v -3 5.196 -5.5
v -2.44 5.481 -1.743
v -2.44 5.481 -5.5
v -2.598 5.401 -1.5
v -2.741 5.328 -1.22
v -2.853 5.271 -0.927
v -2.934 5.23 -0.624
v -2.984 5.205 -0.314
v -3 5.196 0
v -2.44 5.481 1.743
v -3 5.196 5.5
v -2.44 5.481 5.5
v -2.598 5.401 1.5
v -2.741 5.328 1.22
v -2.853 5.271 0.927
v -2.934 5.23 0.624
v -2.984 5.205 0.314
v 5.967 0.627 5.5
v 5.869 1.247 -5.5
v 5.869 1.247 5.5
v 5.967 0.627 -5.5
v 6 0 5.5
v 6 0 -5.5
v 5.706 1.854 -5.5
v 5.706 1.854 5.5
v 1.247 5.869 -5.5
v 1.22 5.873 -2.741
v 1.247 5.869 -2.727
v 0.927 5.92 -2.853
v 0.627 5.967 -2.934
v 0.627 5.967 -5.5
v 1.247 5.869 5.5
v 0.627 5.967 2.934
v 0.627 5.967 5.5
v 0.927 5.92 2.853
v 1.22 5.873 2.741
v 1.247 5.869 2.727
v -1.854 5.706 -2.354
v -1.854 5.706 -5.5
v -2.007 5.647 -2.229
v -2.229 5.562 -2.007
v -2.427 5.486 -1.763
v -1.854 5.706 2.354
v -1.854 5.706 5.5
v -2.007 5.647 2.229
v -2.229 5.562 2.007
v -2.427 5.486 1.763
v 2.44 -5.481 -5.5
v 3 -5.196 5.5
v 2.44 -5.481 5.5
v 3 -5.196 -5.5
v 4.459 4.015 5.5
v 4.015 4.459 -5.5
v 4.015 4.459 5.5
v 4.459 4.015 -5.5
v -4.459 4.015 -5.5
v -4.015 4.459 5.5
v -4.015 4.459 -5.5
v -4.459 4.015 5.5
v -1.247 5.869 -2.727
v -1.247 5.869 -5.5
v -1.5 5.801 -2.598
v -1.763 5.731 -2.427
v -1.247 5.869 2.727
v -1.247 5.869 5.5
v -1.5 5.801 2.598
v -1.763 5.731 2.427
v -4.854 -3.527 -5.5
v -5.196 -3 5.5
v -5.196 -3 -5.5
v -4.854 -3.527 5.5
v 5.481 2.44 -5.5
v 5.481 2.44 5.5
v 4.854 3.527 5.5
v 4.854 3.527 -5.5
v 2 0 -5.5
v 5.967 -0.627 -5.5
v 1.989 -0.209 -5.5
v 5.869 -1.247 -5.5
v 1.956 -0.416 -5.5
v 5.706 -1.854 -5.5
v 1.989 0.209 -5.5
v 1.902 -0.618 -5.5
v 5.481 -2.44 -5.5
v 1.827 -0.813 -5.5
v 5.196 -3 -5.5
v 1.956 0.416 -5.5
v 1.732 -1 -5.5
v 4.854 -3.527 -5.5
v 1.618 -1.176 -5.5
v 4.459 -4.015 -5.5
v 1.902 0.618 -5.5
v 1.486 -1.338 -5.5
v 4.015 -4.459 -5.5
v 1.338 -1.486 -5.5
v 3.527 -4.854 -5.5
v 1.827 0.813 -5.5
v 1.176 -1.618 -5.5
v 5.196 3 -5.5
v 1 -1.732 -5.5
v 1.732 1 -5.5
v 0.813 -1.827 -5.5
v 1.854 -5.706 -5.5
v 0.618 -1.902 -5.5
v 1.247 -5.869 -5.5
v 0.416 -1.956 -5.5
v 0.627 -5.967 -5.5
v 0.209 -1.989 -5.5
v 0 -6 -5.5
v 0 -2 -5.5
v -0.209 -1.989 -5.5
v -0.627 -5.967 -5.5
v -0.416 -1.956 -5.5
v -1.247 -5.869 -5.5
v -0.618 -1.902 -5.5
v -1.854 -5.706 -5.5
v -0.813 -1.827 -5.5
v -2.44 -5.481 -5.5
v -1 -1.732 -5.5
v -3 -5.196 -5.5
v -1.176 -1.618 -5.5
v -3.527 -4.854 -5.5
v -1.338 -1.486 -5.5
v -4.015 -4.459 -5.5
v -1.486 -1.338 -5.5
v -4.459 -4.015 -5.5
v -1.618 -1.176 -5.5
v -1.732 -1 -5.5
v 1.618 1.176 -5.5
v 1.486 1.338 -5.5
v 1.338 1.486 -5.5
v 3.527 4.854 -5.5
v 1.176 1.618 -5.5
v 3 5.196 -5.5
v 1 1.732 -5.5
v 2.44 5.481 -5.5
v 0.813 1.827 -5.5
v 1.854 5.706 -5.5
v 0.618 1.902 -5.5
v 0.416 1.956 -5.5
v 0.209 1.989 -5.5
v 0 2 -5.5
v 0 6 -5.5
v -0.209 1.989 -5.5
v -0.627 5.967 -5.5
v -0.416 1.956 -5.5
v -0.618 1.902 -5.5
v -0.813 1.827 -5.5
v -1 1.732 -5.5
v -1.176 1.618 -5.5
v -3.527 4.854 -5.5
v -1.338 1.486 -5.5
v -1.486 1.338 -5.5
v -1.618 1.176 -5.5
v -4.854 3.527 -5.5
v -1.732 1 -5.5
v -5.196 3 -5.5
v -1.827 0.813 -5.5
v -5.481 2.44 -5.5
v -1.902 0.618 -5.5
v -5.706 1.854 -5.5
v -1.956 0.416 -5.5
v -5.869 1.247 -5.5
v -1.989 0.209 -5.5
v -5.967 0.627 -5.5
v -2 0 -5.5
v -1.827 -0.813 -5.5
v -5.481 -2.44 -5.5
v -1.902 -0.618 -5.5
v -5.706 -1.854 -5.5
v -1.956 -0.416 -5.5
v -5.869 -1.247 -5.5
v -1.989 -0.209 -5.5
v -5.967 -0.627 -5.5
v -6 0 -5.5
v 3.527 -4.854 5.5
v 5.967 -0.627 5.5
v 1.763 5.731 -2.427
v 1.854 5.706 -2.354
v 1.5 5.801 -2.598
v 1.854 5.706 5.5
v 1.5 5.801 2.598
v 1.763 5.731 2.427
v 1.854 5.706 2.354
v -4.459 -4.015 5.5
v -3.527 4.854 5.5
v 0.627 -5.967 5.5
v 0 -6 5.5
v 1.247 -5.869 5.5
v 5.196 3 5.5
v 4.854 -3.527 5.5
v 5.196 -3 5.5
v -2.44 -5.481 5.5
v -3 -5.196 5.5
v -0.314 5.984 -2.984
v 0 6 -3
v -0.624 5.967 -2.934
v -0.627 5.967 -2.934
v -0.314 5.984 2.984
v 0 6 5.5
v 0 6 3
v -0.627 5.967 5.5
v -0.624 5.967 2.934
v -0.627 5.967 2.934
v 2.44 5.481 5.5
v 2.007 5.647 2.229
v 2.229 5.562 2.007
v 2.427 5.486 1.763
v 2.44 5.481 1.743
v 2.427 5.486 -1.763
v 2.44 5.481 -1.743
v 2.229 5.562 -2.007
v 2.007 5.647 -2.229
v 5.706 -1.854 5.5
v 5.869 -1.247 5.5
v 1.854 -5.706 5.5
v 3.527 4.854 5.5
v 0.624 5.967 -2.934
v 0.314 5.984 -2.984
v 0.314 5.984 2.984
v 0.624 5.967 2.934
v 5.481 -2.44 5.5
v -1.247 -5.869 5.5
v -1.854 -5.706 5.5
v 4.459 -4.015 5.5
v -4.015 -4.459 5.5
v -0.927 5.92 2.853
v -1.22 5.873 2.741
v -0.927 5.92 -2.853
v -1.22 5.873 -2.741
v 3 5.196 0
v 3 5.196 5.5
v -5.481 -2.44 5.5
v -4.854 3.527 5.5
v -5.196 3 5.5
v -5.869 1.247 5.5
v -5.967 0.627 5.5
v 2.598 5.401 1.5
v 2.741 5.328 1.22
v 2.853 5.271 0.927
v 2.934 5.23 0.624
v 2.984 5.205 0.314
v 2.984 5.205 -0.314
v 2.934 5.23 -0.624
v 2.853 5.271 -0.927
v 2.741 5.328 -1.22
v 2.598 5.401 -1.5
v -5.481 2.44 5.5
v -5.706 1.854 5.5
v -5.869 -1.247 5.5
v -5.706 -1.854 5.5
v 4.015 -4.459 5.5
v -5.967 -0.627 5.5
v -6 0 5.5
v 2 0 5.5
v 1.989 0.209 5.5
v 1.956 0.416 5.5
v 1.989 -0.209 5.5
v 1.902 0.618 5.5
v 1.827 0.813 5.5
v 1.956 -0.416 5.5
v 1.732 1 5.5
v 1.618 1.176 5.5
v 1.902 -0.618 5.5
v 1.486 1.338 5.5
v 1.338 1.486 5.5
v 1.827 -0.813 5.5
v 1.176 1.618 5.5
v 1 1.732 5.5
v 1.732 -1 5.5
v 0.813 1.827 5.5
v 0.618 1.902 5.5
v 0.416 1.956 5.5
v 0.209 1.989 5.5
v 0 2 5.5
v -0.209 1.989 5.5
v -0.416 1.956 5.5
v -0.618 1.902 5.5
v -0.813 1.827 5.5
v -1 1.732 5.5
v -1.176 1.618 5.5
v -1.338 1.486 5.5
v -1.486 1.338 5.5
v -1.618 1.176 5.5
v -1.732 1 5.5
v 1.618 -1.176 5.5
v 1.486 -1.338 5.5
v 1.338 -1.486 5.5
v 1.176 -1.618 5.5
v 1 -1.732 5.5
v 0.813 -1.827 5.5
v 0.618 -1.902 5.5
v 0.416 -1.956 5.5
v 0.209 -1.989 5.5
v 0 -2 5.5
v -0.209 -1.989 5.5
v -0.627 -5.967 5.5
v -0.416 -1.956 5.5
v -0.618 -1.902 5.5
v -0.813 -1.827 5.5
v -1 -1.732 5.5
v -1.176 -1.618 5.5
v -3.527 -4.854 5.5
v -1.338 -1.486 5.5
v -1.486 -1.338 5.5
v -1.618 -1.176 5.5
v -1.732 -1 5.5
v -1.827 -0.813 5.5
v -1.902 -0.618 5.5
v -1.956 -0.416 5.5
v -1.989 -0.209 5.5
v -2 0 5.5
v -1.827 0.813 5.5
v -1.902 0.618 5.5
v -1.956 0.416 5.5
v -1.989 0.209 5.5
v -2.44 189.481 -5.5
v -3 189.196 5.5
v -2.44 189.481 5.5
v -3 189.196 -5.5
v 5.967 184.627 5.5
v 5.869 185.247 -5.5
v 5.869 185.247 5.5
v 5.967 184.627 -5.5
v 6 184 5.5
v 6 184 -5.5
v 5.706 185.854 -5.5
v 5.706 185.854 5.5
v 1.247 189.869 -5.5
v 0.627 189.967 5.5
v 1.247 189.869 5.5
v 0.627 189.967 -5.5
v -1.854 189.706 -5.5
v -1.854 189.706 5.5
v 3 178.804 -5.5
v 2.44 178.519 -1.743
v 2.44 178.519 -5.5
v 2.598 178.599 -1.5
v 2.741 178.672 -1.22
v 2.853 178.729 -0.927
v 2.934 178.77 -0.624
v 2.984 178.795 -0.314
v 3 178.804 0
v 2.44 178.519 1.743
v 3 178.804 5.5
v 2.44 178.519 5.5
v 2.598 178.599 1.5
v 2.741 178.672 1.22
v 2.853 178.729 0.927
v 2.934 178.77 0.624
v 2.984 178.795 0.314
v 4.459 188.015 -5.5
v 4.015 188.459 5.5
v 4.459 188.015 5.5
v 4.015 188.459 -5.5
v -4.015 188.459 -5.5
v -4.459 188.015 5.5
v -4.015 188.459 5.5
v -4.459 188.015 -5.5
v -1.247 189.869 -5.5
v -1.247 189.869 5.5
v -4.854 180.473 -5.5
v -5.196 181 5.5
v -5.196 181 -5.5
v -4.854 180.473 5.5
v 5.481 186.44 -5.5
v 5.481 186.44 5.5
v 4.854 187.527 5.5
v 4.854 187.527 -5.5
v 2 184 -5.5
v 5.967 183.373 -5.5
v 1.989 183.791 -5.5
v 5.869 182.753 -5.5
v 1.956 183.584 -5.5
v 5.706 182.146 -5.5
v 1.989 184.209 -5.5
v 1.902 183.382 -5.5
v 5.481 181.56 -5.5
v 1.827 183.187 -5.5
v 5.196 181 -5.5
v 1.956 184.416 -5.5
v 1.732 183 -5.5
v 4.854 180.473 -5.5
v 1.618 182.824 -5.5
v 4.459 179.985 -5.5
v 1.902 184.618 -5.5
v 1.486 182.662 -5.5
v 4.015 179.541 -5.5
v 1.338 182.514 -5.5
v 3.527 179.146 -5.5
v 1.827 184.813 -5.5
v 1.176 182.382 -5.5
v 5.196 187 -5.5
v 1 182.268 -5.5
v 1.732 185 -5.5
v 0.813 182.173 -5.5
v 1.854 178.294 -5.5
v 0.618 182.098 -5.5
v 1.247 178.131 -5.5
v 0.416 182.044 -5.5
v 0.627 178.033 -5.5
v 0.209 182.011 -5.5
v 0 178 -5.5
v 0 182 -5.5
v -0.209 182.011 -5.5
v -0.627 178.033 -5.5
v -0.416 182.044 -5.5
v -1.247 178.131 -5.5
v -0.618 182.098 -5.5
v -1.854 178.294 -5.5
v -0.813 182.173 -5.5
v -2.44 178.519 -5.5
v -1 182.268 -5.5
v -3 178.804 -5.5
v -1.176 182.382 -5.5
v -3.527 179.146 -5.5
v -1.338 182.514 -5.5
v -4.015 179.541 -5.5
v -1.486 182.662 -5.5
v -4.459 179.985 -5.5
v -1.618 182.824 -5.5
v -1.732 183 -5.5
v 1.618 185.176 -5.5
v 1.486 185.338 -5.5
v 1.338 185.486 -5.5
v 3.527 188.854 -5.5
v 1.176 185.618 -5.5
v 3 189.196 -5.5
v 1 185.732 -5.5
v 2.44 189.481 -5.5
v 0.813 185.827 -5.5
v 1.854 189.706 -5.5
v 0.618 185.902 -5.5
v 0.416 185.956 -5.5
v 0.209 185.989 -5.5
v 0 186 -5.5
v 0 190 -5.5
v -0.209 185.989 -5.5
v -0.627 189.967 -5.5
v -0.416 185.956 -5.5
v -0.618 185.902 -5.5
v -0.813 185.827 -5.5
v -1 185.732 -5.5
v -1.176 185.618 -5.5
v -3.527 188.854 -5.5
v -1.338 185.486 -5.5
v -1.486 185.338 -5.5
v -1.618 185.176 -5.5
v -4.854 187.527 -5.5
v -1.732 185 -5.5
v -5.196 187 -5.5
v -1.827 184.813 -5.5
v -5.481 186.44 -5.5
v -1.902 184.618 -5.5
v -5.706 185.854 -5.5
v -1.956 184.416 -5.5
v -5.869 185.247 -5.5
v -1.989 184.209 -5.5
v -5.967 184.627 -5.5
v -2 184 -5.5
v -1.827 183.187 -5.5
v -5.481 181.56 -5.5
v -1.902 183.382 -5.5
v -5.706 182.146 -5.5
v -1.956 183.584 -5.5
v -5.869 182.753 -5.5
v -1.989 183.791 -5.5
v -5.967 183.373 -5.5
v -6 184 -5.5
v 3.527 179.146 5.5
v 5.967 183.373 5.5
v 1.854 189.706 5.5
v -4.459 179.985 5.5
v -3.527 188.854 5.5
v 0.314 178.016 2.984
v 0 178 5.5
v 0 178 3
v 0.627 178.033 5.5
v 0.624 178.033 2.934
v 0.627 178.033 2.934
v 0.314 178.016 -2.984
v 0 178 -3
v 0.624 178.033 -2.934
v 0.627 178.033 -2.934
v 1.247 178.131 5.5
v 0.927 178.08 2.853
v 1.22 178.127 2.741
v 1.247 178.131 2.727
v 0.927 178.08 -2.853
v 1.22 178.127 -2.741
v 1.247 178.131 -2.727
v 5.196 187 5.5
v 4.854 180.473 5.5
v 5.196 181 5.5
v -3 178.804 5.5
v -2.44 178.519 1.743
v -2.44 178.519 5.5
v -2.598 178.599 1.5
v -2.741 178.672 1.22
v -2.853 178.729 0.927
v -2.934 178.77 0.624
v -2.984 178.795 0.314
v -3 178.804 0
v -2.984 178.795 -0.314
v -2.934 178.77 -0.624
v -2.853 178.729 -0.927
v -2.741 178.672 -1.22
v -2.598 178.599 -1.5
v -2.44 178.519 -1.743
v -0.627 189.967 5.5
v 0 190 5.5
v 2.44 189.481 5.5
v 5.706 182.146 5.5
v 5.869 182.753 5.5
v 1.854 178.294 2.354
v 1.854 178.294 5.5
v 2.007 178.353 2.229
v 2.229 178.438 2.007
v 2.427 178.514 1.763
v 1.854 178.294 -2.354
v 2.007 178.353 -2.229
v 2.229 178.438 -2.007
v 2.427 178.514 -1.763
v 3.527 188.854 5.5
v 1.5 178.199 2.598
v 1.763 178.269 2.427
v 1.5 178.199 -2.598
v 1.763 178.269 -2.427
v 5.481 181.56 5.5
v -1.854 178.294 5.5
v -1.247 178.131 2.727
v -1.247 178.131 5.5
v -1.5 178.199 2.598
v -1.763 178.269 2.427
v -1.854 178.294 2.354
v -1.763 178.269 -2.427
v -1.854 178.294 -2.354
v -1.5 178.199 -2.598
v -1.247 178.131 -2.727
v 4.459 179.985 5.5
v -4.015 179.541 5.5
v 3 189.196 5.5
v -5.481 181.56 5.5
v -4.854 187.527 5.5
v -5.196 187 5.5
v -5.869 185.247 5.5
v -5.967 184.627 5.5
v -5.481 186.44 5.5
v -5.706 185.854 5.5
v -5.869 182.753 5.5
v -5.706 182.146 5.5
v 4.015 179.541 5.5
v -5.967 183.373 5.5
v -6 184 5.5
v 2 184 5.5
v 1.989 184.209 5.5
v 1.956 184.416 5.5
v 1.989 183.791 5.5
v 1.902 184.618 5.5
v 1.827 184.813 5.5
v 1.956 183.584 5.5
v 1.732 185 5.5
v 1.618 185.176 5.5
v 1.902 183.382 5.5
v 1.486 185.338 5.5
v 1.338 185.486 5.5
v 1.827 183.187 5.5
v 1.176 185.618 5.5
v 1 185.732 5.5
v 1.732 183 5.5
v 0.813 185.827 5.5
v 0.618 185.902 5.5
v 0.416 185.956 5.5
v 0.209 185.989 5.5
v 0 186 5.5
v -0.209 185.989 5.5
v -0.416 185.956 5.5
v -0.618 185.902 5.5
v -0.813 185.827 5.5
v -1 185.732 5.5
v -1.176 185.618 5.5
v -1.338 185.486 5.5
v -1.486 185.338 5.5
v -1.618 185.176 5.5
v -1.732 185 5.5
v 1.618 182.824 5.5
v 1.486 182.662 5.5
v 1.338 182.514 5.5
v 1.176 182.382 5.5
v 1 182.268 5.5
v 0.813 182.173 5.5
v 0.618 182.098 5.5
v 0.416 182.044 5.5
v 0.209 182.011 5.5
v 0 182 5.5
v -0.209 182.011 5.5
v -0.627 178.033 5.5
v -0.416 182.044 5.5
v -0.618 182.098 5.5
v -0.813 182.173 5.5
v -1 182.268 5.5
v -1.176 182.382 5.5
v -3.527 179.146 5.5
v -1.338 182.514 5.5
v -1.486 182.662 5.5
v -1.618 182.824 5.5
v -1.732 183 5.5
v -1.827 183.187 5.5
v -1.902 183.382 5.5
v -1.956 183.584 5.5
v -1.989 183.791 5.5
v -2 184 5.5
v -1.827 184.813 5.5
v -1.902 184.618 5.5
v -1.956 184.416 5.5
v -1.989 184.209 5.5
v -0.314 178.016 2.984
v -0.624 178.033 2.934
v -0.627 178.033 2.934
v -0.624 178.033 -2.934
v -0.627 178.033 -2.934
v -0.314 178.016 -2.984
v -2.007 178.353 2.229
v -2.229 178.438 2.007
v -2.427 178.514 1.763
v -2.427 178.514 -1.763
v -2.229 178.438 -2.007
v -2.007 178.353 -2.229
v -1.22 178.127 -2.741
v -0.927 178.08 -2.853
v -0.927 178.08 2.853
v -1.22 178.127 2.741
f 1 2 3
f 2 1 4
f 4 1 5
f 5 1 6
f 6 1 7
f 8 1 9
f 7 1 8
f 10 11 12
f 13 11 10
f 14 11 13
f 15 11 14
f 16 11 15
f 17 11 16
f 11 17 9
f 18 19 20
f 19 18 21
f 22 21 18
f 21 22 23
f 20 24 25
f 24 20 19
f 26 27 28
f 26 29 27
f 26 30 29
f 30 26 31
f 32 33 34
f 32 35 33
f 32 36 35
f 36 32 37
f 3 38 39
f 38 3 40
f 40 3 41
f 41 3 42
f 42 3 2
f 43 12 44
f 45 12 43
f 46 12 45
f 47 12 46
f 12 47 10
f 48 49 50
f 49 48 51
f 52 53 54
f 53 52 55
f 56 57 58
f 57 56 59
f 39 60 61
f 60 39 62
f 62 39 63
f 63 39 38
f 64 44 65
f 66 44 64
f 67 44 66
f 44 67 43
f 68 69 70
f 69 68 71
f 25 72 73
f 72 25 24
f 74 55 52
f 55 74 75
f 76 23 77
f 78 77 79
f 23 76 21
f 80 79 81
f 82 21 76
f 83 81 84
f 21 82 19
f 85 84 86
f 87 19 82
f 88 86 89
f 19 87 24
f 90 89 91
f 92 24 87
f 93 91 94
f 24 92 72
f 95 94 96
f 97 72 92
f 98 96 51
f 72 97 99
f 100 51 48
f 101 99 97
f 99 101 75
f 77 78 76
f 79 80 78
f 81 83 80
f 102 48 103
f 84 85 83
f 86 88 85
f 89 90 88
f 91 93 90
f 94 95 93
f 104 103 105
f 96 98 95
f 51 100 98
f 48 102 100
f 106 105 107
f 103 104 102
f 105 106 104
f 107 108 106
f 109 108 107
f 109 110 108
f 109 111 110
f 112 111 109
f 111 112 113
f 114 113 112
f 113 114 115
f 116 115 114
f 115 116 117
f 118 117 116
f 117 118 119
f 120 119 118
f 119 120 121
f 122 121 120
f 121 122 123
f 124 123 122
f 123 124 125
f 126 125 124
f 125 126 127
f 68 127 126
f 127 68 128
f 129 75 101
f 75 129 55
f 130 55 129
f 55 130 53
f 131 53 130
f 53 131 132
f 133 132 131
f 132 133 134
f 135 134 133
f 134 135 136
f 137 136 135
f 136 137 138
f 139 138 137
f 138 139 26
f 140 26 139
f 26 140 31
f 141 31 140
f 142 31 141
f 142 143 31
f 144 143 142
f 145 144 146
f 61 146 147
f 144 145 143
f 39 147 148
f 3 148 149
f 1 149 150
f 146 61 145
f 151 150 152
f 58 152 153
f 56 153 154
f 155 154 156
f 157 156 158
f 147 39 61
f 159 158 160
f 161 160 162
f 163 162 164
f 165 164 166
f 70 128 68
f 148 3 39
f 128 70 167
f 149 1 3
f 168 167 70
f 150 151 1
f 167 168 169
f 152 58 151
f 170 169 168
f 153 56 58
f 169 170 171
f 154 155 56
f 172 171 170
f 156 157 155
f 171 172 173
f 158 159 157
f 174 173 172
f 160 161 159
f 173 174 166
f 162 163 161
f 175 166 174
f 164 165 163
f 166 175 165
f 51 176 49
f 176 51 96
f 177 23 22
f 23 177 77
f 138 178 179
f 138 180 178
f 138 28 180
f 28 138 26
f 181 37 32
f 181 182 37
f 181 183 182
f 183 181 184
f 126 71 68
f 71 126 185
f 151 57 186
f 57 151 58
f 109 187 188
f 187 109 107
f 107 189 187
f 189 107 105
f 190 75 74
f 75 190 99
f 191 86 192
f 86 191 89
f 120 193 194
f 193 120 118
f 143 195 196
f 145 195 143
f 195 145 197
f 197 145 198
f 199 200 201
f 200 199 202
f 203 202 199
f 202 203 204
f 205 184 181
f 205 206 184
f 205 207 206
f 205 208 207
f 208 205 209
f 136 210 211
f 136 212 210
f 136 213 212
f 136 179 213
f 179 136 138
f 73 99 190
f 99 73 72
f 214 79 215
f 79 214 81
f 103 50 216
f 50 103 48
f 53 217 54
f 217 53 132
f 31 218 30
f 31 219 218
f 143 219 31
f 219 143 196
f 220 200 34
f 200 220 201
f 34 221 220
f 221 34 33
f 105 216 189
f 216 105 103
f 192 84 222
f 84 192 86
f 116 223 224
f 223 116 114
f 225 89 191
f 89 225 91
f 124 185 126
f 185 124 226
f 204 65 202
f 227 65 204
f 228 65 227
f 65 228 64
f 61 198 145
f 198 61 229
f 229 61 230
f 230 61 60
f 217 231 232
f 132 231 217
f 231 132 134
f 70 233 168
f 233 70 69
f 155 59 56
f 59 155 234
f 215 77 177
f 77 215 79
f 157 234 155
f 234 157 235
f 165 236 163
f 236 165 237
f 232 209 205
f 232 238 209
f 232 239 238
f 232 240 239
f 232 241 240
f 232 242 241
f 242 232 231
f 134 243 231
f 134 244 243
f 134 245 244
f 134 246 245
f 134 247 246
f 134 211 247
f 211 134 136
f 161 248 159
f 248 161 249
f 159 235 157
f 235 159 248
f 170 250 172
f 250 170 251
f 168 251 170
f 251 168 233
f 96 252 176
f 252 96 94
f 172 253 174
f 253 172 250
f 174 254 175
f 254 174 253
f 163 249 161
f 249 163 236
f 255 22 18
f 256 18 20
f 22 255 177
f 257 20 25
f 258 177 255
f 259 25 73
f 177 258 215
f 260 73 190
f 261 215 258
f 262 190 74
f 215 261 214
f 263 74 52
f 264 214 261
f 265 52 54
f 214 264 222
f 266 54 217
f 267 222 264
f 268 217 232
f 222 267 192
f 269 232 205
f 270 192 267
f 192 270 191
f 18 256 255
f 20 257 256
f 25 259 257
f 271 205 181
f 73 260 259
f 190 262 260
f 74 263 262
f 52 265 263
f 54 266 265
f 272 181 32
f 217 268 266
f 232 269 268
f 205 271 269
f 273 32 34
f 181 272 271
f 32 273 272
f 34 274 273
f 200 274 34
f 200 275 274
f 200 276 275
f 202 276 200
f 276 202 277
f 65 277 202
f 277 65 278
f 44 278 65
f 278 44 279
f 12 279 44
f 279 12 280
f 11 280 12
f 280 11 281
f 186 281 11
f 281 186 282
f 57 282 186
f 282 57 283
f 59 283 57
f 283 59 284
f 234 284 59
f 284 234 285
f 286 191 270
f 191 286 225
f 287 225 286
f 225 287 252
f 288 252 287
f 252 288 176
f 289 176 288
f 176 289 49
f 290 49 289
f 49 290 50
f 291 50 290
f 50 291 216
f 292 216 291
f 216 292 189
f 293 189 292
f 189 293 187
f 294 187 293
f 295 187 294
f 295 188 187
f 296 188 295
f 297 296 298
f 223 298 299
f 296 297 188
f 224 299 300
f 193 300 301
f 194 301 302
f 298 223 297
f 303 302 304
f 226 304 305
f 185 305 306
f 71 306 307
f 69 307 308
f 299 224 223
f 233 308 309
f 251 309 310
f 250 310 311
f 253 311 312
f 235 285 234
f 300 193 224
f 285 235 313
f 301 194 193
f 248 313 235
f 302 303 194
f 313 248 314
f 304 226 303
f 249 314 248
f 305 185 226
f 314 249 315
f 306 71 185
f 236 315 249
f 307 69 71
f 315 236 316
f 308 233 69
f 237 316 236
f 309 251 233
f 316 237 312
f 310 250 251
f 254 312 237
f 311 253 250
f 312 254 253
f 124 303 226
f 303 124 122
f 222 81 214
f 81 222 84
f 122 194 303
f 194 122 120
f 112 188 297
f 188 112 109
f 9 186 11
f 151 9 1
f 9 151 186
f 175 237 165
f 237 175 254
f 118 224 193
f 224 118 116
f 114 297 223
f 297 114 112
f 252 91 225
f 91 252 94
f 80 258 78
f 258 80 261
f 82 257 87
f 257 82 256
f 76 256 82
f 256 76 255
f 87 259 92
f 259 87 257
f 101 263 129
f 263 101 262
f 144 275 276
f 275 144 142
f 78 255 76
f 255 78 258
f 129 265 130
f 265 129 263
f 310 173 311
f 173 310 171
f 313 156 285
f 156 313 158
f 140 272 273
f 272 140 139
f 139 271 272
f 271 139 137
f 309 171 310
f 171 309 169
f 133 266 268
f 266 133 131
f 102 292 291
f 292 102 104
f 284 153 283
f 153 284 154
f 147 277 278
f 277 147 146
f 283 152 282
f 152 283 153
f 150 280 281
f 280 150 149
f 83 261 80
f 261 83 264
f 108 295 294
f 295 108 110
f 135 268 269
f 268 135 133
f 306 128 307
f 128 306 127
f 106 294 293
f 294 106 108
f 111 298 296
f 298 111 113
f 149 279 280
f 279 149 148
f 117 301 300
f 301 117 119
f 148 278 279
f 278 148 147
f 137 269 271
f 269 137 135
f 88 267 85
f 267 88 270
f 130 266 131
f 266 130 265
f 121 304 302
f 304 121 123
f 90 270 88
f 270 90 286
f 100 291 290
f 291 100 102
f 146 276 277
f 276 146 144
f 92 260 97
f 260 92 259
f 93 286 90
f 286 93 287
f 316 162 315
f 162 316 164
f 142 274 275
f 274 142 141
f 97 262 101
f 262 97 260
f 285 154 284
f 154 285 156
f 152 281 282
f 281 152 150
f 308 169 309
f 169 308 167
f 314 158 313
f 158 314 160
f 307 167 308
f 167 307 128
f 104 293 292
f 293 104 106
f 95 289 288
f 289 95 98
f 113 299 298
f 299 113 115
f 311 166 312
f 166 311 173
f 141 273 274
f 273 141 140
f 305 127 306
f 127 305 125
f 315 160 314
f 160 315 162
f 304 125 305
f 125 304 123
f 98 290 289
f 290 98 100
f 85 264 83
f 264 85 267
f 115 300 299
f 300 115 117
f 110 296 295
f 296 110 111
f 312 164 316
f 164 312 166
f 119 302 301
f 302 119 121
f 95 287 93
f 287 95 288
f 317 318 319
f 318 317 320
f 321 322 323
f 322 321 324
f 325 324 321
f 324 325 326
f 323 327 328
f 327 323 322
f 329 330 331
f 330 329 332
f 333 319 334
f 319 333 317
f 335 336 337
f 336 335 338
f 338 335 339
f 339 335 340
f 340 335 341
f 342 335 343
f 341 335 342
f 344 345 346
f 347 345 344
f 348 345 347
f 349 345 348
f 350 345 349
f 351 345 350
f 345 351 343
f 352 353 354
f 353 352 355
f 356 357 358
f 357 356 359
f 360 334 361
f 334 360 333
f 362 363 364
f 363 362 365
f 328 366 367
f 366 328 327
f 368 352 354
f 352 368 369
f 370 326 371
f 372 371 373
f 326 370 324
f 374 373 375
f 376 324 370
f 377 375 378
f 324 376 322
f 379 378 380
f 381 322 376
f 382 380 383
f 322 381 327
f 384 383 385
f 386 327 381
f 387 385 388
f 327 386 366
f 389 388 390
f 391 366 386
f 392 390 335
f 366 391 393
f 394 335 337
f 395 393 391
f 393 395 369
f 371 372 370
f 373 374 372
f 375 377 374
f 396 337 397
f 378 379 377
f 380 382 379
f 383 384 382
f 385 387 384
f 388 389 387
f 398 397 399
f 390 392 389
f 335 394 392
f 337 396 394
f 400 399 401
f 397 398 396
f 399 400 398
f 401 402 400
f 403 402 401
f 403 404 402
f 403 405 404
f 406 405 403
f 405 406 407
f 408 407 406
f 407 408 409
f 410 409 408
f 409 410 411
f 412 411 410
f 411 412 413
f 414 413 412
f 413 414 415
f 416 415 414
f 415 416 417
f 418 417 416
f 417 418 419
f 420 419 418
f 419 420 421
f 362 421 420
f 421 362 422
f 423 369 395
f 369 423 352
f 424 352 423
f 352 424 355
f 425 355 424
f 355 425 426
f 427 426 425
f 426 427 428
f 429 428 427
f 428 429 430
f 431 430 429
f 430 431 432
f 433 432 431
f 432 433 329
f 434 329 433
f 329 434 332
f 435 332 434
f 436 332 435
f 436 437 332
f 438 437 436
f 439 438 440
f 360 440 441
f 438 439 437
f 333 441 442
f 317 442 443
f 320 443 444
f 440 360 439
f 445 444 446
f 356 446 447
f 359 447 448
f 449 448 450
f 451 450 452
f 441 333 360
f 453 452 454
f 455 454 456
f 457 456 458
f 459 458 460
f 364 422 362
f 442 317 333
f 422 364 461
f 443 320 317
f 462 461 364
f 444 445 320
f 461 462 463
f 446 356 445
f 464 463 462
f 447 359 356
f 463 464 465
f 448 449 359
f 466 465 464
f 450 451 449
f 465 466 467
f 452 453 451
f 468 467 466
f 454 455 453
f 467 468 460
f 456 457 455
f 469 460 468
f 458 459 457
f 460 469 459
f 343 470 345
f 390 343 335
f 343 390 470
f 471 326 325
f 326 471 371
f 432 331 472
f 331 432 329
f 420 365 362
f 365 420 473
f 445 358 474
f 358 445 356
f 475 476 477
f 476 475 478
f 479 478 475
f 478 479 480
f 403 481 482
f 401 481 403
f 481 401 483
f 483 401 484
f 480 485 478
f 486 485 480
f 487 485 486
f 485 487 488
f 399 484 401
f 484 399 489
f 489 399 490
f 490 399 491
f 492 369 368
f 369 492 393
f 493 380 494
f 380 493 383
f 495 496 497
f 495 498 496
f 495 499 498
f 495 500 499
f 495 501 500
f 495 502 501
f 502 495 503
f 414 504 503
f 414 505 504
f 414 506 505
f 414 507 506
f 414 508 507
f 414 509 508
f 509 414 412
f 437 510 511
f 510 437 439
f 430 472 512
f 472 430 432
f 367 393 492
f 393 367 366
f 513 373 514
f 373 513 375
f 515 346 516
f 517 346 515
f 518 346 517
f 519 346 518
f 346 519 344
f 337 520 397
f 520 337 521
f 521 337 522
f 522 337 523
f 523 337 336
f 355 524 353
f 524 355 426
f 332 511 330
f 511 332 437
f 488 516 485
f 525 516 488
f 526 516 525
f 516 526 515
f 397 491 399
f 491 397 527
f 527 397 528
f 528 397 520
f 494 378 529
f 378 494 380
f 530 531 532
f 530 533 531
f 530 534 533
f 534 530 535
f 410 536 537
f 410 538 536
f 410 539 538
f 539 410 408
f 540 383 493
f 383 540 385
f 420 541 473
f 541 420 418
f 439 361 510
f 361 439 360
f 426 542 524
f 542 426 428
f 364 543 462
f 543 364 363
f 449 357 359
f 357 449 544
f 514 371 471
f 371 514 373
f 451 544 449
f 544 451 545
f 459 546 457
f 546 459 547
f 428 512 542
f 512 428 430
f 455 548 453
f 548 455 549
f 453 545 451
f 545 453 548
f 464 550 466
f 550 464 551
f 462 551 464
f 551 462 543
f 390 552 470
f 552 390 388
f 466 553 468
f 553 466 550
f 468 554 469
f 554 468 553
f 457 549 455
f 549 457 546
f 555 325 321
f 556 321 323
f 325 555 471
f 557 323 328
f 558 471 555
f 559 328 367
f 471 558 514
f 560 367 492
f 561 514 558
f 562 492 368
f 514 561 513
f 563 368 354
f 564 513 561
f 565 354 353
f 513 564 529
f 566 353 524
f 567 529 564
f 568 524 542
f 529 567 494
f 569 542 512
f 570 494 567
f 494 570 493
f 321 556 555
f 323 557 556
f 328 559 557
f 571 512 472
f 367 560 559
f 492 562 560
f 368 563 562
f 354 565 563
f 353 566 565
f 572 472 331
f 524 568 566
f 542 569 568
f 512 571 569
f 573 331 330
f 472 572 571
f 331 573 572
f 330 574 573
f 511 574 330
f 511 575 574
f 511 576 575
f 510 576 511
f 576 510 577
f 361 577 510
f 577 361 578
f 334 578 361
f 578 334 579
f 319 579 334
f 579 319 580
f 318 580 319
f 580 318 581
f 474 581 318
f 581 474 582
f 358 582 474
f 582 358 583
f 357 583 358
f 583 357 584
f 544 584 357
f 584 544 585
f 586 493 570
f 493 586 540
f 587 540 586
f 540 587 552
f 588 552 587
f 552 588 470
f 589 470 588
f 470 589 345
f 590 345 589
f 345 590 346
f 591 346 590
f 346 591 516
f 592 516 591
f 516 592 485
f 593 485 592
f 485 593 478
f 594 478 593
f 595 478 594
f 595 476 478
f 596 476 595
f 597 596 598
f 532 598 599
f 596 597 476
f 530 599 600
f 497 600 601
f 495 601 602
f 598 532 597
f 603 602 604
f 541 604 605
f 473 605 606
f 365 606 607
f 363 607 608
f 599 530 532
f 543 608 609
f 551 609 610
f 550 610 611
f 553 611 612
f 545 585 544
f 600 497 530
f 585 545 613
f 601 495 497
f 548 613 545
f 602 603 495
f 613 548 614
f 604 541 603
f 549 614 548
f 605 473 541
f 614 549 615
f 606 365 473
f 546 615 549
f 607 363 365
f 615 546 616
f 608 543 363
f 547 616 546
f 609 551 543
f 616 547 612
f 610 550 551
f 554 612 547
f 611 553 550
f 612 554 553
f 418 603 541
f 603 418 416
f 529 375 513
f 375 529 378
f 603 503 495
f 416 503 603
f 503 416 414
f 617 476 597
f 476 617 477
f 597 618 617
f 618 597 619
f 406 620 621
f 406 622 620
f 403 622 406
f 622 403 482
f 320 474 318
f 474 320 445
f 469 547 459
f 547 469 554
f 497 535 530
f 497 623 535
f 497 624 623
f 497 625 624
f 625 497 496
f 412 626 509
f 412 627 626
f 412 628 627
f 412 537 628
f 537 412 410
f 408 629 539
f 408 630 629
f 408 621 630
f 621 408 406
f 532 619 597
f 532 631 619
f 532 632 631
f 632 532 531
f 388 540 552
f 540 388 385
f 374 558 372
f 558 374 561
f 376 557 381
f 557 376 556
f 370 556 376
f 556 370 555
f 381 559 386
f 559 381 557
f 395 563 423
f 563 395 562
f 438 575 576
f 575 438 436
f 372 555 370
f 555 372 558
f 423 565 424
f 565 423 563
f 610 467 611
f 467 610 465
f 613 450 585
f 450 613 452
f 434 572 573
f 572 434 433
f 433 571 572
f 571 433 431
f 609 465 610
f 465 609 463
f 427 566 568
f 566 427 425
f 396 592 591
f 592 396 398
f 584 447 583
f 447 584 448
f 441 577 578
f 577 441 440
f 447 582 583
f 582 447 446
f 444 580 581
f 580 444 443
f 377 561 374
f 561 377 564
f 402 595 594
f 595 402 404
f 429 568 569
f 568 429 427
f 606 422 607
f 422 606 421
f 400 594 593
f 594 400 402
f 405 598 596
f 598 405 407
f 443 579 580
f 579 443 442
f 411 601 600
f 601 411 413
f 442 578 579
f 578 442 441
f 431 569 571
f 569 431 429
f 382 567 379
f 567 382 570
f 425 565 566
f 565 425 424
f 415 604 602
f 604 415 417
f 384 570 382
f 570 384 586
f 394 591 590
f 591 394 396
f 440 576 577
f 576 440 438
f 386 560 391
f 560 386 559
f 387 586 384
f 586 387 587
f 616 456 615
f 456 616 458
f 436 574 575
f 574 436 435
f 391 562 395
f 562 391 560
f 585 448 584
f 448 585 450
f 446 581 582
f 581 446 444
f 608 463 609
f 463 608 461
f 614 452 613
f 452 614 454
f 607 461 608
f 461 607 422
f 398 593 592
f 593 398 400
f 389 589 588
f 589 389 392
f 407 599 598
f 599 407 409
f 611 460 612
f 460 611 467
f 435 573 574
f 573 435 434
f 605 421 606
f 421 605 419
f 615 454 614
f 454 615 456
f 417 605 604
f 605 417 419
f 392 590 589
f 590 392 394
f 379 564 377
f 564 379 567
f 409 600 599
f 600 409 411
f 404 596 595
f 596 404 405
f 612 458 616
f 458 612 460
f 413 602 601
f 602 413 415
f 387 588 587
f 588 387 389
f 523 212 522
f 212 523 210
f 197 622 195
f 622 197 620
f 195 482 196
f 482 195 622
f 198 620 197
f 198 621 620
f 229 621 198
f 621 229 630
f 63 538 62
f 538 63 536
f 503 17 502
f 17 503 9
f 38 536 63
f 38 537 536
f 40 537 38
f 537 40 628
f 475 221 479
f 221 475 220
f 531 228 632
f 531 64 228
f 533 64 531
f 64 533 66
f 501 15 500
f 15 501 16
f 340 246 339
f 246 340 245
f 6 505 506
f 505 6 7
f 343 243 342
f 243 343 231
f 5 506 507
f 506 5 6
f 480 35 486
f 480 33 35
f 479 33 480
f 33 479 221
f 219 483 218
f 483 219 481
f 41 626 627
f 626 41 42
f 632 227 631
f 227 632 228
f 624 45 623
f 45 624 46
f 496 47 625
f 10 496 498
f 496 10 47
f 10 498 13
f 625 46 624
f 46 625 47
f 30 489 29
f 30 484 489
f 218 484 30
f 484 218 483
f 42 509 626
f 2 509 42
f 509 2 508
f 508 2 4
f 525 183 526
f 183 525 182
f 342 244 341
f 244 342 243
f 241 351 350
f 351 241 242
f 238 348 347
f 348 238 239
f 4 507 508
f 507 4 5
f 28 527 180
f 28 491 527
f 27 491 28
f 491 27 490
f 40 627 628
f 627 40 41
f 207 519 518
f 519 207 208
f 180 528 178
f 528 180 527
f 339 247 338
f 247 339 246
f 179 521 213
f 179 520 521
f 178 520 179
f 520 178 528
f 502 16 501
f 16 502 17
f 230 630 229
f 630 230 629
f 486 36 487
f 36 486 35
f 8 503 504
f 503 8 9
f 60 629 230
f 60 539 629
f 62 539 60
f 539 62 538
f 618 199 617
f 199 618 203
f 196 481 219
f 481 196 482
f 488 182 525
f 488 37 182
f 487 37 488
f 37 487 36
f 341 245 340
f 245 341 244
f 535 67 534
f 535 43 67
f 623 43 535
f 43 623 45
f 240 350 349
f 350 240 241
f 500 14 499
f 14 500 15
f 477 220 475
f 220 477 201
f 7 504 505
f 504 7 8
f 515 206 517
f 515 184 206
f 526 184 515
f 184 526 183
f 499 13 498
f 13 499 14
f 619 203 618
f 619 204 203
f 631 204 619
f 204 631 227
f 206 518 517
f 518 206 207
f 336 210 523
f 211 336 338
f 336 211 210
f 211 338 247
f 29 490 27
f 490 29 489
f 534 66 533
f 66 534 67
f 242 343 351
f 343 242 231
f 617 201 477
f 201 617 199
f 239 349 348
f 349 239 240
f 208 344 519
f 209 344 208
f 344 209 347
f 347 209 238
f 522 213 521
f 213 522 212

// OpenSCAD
// Тяга колена. Open this file, F5 preview, F6 render, export STL.
use <reference_model.scad>
$fn=60;
connect_points_rod([0,0,0],[0,184,0],diameter=6,plate_thickness=11);
